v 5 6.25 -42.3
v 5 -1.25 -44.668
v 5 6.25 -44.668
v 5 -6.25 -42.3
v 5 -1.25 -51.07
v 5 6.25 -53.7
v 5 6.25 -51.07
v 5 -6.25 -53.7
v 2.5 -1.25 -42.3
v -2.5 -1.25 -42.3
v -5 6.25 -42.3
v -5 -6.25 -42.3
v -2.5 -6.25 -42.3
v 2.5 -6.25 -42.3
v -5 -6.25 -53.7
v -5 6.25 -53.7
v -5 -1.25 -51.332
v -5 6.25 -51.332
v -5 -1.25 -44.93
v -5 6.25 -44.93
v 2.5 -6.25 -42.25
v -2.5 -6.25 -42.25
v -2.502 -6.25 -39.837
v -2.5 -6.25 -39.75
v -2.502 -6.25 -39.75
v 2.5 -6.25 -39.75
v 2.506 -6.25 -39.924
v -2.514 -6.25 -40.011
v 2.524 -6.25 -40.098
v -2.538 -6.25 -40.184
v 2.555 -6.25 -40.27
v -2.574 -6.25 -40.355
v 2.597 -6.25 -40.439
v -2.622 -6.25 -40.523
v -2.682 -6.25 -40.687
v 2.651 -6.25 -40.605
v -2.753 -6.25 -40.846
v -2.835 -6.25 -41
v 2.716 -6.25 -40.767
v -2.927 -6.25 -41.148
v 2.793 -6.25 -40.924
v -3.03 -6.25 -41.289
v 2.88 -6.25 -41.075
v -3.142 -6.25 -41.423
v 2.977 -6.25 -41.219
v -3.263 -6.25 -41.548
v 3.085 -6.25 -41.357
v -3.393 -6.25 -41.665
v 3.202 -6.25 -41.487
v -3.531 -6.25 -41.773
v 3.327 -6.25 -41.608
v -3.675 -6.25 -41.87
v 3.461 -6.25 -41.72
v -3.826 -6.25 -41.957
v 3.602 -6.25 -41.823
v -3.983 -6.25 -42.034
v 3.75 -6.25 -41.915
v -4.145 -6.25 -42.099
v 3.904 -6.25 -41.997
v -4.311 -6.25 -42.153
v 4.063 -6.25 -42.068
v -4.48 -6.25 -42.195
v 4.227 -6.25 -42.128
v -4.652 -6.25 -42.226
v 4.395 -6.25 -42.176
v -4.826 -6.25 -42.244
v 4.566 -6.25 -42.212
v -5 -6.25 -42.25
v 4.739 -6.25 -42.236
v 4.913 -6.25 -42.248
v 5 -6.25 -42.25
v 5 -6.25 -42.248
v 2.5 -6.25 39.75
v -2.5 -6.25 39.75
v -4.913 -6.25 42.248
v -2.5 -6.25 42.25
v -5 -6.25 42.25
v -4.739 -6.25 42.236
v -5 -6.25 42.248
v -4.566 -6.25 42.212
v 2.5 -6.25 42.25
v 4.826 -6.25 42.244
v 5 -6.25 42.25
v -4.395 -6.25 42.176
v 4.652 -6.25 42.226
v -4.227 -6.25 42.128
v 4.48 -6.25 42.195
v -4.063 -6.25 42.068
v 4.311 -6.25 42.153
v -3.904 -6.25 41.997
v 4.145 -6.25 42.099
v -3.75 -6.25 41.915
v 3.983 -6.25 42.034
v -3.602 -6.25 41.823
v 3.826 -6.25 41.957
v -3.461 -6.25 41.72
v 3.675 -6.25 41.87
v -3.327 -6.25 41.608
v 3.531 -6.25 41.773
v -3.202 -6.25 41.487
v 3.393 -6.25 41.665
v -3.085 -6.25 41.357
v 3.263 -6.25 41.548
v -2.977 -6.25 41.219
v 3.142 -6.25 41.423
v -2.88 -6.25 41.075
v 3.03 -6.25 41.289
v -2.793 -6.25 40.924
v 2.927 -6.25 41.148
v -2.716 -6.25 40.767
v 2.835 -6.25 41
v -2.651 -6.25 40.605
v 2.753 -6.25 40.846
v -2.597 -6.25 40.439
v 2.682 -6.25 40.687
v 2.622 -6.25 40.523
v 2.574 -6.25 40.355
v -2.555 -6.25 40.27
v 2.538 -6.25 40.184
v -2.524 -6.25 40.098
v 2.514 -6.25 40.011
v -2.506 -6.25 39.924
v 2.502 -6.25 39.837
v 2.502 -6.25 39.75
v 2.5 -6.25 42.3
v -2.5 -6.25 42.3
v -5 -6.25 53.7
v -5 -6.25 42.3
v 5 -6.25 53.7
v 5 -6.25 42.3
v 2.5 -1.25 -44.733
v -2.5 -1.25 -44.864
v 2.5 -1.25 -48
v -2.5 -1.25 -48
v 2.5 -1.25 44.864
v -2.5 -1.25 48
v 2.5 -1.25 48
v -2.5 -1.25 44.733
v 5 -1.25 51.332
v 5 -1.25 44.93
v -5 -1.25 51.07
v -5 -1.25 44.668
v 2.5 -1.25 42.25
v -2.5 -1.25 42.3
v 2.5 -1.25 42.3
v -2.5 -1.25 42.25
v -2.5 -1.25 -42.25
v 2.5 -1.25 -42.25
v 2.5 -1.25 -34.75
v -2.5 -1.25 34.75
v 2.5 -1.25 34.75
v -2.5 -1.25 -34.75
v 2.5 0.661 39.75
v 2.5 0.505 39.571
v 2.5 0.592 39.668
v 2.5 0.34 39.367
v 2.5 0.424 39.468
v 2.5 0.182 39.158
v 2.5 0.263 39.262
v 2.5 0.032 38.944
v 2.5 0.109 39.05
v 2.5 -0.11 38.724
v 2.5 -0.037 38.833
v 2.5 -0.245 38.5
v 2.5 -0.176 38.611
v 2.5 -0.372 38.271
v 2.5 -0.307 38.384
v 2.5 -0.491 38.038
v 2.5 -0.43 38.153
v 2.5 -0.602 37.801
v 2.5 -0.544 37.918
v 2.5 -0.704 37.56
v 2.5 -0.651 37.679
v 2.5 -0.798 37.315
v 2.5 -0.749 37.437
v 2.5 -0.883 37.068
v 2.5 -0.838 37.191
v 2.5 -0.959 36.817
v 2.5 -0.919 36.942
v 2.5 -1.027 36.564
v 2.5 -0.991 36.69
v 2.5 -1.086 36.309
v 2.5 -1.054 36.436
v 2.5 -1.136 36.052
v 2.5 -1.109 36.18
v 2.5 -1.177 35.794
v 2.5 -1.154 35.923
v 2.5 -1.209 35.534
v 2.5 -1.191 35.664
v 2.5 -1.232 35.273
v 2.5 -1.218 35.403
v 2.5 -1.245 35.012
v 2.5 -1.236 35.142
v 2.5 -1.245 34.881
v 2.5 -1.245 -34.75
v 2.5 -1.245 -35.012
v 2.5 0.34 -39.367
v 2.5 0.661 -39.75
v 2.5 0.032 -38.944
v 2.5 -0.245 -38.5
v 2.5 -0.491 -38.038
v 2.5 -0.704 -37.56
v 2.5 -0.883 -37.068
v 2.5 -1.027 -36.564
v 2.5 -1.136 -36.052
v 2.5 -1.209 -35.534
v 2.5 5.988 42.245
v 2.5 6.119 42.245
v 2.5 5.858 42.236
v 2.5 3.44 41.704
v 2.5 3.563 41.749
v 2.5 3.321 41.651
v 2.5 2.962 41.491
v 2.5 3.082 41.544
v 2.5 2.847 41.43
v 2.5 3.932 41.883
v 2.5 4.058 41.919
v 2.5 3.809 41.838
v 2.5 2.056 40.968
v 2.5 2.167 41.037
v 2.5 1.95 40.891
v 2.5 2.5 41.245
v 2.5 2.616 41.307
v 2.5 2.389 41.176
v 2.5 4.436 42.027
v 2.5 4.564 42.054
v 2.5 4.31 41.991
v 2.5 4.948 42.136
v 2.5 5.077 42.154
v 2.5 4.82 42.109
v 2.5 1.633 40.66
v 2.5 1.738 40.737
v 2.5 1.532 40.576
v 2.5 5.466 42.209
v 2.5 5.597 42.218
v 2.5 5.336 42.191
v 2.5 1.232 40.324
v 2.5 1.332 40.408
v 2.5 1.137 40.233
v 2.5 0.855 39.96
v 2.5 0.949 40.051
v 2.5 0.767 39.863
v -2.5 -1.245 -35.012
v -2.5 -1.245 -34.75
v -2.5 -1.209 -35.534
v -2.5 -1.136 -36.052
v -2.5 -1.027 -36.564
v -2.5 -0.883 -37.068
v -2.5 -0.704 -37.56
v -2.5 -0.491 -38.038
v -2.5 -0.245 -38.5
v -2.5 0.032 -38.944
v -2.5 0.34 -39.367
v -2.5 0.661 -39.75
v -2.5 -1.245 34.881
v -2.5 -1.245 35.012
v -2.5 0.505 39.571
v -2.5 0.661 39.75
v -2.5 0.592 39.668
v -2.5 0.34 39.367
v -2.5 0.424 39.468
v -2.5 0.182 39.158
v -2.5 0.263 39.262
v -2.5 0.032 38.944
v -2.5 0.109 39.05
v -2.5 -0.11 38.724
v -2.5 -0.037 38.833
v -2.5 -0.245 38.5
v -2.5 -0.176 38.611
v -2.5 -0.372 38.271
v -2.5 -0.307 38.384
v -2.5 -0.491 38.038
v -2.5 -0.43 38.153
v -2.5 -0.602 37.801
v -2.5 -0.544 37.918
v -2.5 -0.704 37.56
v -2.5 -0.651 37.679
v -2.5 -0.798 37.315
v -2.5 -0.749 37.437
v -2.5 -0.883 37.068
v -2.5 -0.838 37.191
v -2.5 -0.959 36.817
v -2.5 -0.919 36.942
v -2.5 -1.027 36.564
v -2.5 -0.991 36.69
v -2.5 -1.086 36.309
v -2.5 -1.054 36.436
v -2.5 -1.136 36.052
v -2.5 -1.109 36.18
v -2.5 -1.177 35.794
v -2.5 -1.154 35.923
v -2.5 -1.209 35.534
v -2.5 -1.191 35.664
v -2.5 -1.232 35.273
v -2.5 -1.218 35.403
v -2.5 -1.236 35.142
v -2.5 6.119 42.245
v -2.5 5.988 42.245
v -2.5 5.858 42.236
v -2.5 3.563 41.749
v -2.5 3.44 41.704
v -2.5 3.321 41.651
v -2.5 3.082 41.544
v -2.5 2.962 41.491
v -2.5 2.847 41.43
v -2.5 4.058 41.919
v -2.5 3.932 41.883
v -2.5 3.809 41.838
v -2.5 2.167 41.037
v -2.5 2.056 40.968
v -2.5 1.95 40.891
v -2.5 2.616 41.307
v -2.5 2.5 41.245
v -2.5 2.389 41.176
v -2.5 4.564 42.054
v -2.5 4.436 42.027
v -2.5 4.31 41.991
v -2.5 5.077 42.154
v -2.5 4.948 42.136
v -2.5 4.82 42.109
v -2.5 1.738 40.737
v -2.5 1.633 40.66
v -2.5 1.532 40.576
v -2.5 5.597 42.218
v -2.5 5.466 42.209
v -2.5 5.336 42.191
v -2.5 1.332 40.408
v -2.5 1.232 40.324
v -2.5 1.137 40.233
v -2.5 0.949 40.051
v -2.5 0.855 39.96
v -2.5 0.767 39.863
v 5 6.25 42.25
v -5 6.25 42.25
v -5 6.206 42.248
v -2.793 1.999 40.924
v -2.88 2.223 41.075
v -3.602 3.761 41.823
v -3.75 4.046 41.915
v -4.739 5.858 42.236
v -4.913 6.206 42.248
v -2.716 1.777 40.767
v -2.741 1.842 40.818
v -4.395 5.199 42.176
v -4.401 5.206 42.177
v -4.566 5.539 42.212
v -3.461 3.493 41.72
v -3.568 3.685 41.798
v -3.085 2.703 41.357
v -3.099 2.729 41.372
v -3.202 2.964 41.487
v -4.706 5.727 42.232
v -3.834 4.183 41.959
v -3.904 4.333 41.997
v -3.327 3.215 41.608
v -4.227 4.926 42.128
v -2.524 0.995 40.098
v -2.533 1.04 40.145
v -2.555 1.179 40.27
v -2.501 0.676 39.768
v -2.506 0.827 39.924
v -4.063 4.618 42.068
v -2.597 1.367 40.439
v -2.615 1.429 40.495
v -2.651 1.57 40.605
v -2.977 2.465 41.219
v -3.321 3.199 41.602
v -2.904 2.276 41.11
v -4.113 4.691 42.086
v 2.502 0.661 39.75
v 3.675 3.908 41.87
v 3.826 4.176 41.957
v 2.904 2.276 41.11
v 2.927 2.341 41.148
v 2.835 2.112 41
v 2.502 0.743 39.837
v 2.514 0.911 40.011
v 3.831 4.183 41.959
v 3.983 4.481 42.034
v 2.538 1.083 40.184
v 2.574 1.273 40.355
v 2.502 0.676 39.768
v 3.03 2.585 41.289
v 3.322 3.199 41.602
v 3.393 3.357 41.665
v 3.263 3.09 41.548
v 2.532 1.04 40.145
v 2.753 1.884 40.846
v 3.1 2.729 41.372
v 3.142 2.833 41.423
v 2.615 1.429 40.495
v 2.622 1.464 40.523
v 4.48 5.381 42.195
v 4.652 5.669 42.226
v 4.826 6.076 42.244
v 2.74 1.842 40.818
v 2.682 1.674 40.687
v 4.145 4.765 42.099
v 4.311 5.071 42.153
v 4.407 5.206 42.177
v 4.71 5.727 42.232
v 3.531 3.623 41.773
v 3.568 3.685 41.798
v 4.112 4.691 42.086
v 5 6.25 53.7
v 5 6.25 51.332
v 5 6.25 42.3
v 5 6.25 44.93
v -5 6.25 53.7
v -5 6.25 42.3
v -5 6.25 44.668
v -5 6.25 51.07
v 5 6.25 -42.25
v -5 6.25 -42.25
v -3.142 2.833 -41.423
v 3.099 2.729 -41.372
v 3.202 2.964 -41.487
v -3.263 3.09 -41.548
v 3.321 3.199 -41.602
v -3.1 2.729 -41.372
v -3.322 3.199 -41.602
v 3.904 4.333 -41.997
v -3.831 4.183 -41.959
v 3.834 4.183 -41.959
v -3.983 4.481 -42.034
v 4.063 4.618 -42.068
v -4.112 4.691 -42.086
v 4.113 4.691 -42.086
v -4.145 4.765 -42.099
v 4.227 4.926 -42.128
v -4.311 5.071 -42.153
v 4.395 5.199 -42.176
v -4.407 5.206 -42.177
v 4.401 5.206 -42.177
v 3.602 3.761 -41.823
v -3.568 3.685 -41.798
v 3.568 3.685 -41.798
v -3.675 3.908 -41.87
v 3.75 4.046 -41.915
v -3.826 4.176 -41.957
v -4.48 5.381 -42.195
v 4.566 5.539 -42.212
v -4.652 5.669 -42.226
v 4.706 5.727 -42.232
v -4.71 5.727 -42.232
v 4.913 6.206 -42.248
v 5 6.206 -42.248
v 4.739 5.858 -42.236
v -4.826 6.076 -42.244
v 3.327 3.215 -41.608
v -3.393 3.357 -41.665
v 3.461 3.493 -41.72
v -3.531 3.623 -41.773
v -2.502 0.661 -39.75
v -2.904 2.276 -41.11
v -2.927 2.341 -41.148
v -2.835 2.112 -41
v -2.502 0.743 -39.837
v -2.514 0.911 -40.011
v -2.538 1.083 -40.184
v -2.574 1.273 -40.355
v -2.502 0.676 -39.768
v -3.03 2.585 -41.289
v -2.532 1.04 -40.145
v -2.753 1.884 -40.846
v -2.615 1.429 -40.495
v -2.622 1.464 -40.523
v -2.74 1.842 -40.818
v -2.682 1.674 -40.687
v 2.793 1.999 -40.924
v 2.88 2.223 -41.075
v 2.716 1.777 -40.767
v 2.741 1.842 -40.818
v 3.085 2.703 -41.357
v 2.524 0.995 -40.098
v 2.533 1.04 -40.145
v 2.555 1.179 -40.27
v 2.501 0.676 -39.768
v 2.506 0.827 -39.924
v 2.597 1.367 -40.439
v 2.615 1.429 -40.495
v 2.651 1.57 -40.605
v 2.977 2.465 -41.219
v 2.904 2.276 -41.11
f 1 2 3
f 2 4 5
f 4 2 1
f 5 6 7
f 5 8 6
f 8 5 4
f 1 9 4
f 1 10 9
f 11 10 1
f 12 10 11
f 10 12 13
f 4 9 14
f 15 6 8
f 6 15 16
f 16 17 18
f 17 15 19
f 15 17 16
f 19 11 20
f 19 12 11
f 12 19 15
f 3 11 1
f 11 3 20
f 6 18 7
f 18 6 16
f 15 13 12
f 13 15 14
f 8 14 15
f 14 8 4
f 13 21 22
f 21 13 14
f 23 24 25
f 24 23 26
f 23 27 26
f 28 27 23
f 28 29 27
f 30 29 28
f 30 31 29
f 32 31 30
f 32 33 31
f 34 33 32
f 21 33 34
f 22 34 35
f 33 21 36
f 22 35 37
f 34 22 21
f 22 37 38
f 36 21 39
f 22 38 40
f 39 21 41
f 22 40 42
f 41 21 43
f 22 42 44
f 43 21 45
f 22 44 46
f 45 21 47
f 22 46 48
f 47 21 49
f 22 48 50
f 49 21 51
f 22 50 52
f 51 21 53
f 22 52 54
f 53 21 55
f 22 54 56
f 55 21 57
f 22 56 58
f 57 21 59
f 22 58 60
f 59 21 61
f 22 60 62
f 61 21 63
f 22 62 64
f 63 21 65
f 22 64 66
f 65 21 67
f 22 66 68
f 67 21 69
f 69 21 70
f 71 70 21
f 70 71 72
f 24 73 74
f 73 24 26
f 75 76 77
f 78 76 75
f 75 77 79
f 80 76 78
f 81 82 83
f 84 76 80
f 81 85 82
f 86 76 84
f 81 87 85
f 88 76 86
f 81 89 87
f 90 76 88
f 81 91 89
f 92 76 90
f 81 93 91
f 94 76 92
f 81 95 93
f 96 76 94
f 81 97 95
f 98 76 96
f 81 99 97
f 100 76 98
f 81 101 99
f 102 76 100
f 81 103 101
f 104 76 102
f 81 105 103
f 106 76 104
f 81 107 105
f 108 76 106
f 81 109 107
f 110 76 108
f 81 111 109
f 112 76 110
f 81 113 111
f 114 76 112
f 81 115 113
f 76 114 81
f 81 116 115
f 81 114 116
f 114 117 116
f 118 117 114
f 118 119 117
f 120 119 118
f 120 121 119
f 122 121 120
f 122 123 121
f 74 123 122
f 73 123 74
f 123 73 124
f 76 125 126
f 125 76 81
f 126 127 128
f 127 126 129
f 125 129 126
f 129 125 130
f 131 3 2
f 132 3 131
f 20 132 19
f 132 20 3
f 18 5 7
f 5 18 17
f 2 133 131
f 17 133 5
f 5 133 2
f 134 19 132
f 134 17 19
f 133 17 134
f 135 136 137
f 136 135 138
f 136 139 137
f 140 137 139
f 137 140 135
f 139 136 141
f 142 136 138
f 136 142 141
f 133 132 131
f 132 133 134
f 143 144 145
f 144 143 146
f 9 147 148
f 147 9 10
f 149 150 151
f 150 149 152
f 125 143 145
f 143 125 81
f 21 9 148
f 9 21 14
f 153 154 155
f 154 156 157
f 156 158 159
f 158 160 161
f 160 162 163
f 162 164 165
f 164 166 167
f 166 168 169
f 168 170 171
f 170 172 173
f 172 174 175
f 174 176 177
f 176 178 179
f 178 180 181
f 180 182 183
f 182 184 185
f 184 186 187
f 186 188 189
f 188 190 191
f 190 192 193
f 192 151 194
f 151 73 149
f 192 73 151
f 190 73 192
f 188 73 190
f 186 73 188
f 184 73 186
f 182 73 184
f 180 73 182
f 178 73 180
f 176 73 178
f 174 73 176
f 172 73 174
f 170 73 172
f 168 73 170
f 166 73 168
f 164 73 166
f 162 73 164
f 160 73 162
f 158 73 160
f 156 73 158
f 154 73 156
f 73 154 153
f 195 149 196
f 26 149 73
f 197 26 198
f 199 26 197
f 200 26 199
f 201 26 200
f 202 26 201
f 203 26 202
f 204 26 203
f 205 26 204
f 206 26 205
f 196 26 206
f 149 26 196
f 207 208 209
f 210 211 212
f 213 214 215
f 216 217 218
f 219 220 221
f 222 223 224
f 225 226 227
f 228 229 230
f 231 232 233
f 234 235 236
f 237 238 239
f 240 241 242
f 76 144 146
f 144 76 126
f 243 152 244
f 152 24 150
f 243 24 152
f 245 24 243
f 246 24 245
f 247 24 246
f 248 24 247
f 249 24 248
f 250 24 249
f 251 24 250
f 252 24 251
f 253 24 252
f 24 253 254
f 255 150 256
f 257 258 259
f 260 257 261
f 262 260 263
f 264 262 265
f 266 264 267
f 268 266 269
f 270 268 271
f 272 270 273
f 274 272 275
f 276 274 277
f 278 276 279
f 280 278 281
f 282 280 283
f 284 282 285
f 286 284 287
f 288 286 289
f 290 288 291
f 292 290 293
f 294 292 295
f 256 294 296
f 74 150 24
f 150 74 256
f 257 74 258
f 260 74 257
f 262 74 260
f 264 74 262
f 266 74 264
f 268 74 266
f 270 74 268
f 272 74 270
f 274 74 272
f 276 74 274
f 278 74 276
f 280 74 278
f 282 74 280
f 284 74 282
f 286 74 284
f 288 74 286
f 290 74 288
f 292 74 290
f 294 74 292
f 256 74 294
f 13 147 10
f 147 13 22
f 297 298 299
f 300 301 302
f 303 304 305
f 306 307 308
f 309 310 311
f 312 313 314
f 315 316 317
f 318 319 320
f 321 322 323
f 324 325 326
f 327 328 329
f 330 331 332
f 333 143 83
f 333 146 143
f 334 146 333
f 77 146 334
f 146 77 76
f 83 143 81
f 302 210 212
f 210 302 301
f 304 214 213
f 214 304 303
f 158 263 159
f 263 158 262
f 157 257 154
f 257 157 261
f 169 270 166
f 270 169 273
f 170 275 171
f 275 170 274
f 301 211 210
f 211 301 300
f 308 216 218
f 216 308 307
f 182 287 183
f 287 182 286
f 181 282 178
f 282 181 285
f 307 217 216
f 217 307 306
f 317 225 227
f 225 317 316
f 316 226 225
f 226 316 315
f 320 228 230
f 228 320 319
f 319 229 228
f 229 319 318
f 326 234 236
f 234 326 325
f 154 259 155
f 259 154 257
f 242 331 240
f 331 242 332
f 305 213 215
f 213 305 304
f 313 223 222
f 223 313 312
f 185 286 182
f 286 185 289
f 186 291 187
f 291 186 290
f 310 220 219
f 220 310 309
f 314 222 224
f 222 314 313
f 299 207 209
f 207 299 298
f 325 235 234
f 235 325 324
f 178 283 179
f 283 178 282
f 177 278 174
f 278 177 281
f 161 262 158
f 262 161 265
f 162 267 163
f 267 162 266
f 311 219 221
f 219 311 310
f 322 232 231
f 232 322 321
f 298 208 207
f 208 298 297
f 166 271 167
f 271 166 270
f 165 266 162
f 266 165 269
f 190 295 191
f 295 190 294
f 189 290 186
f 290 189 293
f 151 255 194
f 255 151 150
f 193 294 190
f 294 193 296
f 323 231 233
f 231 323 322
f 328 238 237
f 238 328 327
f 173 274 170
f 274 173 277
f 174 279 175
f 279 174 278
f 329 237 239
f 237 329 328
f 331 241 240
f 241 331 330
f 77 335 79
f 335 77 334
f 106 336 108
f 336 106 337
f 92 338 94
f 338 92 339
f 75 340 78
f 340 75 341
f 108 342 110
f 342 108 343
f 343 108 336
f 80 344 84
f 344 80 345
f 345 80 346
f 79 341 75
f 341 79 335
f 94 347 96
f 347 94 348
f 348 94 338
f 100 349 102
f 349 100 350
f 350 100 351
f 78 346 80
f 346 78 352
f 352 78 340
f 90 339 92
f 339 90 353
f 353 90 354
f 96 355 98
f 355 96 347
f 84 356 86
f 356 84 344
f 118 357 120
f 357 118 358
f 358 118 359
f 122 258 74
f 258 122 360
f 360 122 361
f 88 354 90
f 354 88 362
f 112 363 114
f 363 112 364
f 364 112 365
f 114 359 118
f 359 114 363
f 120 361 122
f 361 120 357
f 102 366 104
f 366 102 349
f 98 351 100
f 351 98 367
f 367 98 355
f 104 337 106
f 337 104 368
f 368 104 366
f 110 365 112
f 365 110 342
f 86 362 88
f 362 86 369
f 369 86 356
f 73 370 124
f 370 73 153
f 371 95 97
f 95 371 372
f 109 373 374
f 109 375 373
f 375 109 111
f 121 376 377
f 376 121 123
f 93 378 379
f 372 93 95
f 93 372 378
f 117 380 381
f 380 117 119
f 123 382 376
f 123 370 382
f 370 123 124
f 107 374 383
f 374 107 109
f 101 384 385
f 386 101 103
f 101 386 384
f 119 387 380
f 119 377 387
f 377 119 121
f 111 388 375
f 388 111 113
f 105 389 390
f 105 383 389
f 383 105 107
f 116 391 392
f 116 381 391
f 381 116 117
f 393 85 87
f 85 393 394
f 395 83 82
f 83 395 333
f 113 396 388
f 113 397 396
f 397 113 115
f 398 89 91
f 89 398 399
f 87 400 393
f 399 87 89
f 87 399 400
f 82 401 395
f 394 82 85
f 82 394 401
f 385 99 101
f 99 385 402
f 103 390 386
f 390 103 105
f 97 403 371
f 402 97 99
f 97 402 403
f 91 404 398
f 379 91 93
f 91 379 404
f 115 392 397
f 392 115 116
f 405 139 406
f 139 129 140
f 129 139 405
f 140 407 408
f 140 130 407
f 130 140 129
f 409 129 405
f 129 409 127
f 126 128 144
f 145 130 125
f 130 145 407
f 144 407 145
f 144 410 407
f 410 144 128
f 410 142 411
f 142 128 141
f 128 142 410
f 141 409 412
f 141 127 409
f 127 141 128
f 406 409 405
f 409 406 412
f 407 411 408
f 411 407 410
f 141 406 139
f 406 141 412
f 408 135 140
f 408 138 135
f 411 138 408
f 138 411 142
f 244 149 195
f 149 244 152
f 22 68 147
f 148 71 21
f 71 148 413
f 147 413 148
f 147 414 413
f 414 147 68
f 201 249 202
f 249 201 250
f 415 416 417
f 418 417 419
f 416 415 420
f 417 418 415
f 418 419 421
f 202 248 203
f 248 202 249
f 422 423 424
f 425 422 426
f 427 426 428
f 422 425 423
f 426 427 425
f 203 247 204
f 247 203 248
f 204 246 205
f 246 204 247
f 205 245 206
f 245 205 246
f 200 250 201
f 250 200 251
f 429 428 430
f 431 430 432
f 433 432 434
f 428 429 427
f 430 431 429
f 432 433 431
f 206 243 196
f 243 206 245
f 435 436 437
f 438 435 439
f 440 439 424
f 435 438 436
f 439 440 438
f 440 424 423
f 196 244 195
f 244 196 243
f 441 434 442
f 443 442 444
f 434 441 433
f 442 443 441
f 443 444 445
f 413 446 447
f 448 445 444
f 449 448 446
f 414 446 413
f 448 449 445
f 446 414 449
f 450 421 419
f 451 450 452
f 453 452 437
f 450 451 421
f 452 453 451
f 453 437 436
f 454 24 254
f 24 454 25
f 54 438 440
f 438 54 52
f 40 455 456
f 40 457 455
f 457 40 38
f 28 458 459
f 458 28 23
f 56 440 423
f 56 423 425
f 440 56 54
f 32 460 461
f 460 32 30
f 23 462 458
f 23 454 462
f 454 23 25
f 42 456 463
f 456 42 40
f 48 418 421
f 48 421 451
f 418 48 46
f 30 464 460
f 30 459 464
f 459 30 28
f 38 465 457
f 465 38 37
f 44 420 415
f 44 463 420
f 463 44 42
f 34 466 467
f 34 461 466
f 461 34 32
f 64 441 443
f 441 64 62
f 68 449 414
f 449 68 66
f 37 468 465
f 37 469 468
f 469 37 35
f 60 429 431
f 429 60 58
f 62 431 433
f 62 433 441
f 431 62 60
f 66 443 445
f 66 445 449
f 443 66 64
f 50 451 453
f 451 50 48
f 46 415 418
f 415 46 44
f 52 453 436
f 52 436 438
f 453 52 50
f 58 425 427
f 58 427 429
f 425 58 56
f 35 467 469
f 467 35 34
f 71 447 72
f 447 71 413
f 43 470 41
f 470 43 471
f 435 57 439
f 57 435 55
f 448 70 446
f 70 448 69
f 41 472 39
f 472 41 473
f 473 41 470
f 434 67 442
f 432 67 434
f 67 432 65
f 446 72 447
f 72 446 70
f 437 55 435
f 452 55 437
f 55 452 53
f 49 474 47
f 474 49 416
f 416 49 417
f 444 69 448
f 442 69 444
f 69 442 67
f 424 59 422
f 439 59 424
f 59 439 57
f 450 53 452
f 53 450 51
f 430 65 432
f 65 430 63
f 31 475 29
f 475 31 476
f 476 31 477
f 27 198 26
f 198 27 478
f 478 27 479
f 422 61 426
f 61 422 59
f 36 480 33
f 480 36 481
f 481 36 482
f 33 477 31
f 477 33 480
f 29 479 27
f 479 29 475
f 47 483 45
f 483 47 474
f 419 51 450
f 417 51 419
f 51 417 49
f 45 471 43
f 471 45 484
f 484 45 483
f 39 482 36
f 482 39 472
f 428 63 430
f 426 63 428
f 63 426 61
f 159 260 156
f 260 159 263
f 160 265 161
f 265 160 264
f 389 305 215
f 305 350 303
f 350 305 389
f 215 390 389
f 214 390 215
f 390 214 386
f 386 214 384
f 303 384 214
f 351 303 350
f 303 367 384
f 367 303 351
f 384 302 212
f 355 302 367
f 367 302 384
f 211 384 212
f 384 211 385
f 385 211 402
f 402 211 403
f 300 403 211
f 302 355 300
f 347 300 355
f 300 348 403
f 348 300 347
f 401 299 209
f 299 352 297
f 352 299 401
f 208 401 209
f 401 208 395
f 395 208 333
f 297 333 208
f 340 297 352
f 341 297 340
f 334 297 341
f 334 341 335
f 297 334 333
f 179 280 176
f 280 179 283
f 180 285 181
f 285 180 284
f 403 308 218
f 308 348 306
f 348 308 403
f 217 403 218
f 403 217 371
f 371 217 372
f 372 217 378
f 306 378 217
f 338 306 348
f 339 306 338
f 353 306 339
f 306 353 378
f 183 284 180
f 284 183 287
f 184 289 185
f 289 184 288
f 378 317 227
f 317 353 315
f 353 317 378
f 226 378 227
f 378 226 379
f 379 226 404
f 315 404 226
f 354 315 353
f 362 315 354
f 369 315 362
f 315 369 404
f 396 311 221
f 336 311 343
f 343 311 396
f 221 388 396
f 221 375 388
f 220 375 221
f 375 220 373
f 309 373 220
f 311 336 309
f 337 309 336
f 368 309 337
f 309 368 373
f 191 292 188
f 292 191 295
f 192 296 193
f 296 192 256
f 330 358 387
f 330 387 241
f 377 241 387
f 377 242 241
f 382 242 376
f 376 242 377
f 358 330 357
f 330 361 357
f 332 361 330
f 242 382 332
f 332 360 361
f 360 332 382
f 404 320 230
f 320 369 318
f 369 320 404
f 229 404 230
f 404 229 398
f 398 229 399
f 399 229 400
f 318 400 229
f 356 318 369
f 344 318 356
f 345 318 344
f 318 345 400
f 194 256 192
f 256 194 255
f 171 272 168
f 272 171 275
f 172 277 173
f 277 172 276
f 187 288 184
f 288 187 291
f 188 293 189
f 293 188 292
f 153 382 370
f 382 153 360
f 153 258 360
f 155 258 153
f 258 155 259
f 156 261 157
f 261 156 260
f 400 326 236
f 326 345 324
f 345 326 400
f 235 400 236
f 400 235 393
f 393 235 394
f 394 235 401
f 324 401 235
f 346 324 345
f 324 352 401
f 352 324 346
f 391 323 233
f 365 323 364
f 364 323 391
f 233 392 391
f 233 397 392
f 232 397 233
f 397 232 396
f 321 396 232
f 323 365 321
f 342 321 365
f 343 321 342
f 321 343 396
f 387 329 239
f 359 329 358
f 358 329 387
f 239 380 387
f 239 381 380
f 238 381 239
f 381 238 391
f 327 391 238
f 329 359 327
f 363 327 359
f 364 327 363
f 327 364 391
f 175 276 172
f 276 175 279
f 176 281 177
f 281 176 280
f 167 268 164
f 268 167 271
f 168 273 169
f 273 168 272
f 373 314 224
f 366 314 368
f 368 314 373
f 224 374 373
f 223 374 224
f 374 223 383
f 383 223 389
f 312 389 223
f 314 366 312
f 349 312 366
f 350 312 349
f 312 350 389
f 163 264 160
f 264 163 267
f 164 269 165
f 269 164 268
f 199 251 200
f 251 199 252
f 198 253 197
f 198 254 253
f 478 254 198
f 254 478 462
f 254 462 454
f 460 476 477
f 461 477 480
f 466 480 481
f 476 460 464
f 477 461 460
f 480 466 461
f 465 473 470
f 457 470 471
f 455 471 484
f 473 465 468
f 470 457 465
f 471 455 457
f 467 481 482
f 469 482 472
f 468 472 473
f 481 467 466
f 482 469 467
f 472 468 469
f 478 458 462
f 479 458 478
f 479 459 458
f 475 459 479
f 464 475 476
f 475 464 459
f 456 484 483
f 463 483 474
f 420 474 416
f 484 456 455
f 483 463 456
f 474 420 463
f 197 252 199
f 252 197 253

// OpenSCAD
$fn = 90;

module spacer(slotAngle = 1.5) {
    
    deckDistance = 96;
    
    
    difference() {
        union() {
            translate([0, -3.75, 0]) cube([5, 5, deckDistance], center = true);

           translate([0, 0, -deckDistance / 2]) lug(slotAngle);
           translate([0, 5 / 2, (deckDistance / 2) - ((11.5 + 7.5) / 2) ]) rotate([-90, 0, 0]) blend(height = 7.5);
           translate([- 7.5 / 2, 0, (deckDistance / 2) - ((11.5 + 2.5) / 2) ]) rotate([-90, 0, 90]) blend(width = 12.5, height = 2.5);
           translate([7.5 / 2, 0, (deckDistance / 2) - ((11.5 + 2.5) / 2) ]) rotate([180, 0, 90]) blend(width = 12.5, height = 2.5);

            translate([0, 0, deckDistance / 2]) lug(slotAngle);
            translate([0, 5 / 2, - (deckDistance / 2) + ((11.5 + 7.5) / 2) ]) rotate([0, 0, 0]) blend(height = 7.5);
            translate([- 7.5 / 2, 0, - (deckDistance / 2) + ((11.5 + 2.5) / 2) ]) rotate([0, 0, 90]) blend(width = 12.5, height = 2.5);
            translate([7.5 / 2, 0, - (deckDistance / 2) + ((11.5 + 2.5) / 2) ]) rotate([90, 0, 90]) blend(width = 12.5, height = 2.5);
        }
        translate([0, 12.5 / 2, (deckDistance / 2) - ((11.5 + 15) / 2)]) rotate([0, 90, 0]) cylinder(h=12.5 + 2, r=7.5, center = true);
        translate([0, 12.5 / 2, - (deckDistance / 2) + ((11.5 + 15) / 2)]) rotate([0, 90, 0]) cylinder(h=12.5 + 2, r=7.5, center = true);
    }
    
}
    

module lug(slotAngle = 1.5) {
    
    slotHeight = 6.4;
    slotDepth = 7.5;
    lugHeight = slotHeight + 5;
    lugDepth = slotDepth + 5;
    lugWidth = 10;
    blendHeight = 1.5;

    difference() {
        cube([lugWidth, lugDepth, lugHeight], center = true);
        translate([0, (lugDepth - slotDepth) / 2, 0]) rotate([0, slotAngle, 0]) cube([lugWidth + 2, slotDepth, slotHeight], center = true);
    }
    
}

module blend(height = 5, width = 5) {
    difference() {
        cube([width, height, height], center = true);
        translate([0, height / 2, height / 2]) rotate([0, 90, 0]) cylinder(h=width*2, r=height, center = true);
    }
}

spacer(slotAngle = -1.5);

    
